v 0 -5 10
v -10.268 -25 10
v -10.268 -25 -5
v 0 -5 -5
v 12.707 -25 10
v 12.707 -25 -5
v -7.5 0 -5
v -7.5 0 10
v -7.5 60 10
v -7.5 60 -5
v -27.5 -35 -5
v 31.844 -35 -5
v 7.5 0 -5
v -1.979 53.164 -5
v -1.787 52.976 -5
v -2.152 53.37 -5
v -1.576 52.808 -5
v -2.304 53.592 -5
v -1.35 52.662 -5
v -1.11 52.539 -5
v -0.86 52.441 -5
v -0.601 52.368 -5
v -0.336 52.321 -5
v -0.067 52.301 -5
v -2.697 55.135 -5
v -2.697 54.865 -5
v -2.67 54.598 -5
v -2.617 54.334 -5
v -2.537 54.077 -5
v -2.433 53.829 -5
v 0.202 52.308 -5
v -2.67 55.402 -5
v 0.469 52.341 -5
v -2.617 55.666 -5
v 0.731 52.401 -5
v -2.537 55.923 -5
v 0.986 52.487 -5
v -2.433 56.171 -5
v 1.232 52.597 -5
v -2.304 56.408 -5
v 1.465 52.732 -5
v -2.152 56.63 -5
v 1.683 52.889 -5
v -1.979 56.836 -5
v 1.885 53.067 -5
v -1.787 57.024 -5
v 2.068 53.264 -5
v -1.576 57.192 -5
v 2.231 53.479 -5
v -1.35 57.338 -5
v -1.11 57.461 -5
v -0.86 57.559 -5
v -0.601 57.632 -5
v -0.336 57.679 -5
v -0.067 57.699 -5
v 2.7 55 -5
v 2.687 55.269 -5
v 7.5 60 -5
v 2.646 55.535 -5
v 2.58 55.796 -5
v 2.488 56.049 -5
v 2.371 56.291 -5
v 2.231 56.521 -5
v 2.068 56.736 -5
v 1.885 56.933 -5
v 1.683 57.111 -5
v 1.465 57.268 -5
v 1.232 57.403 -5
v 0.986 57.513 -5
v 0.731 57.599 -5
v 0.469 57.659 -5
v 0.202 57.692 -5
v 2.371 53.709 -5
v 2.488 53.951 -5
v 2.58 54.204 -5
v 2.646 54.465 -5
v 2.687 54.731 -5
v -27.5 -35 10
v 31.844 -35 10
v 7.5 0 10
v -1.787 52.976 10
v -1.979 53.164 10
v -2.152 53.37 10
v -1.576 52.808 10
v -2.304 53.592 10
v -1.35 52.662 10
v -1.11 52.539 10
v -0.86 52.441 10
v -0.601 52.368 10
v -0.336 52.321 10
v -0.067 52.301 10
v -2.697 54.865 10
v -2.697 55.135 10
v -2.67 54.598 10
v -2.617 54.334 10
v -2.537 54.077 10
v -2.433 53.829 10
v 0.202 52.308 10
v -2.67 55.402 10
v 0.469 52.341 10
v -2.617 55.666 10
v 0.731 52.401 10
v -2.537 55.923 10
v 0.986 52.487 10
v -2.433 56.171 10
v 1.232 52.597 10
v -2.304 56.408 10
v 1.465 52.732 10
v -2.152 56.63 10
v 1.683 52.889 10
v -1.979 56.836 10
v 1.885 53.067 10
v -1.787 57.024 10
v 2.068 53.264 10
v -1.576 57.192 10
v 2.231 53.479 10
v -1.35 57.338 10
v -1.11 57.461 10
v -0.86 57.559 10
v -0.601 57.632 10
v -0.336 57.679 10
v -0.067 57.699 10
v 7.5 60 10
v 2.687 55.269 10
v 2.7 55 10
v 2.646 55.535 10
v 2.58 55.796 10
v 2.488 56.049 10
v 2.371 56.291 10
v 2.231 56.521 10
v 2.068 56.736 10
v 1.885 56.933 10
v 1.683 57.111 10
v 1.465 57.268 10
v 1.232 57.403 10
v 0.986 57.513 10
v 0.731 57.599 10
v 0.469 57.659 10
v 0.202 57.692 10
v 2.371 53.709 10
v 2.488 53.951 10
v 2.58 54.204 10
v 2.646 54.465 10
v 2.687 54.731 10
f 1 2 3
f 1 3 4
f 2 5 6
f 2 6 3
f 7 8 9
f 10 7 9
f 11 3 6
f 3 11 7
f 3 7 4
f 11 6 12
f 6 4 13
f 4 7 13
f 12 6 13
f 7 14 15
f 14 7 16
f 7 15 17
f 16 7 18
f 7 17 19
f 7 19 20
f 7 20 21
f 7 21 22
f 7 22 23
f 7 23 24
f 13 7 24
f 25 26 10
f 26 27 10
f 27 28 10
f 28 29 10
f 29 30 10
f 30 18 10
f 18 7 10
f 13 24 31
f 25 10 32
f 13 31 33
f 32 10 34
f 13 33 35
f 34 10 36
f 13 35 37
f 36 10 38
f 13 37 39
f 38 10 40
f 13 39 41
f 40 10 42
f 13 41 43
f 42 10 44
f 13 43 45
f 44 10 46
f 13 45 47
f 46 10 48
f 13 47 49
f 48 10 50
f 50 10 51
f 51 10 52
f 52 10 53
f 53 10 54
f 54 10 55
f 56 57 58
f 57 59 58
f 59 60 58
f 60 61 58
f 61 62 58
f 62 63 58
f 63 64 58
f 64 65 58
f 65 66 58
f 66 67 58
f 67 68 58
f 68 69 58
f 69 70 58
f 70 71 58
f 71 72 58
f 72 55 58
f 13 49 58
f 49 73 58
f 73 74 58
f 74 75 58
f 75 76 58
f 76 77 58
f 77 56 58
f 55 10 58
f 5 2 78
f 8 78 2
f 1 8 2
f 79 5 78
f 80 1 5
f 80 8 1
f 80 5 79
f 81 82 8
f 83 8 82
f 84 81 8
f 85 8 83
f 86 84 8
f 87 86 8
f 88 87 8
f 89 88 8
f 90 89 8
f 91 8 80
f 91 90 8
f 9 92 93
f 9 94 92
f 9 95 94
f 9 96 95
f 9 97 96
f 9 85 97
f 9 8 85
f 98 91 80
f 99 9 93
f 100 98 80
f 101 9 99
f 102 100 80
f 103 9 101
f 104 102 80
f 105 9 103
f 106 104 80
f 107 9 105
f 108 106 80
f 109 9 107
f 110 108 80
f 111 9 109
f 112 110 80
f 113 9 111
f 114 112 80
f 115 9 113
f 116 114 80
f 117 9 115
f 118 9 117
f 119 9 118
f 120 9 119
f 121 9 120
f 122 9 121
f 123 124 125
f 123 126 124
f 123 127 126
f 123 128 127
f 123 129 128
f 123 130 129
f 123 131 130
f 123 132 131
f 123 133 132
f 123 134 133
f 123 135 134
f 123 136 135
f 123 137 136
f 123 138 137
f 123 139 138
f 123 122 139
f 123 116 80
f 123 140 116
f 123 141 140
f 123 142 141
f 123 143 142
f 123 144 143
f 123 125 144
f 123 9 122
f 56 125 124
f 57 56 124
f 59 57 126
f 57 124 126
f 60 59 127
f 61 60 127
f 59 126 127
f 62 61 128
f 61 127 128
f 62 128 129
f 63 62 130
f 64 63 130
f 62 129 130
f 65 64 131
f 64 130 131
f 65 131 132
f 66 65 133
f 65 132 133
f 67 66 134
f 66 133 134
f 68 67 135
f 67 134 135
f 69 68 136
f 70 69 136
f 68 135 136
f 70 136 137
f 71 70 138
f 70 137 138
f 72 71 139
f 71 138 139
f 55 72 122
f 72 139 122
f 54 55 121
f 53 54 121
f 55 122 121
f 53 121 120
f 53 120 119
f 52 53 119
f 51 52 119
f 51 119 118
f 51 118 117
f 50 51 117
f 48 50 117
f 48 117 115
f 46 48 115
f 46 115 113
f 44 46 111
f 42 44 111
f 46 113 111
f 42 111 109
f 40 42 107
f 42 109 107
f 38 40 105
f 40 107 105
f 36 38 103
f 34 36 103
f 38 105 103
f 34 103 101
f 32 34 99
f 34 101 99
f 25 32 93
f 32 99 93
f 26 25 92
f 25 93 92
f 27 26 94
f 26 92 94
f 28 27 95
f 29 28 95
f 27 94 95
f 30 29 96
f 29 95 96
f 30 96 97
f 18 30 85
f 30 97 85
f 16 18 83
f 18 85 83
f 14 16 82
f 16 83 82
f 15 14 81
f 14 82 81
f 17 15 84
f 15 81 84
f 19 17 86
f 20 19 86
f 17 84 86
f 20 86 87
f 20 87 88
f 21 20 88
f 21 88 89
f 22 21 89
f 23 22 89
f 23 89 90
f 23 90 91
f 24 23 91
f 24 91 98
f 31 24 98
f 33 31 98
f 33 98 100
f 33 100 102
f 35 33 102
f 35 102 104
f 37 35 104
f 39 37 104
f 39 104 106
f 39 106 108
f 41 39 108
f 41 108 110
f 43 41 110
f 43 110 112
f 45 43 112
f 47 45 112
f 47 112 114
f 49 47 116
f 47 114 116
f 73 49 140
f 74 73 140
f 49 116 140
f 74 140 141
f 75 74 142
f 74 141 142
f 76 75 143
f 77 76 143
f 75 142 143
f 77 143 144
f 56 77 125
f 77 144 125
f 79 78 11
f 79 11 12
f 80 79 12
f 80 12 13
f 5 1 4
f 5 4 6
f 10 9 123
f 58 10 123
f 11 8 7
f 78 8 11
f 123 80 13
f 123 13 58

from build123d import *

# Parameters (mm, degrees)
SALIENTE_EXTRUIR1_DEPTH = 10
CROQUIS2_R              = 2.5
CORTAR_EXTRUIR1_DEPTH   = 10
CROQUIS4_W              = 15
CROQUIS4_H              = 60
SALIENTE_EXTRUIR2_DEPTH = 15
SALIENTE_EXTRUIR3_DEPTH = 15
CROQUIS6_R              = 2.7
CORTAR_EXTRUIR2_DEPTH   = 15


with BuildPart() as part:
    # Croquis1 → Saliente-Extruir1 (new body)
    with BuildSketch(Plane.XY):
        Polygon((-7.5, 0), (-27.5, -35), (-7.5, -35), (11.843788115, -35), (31.843788115, -35), (7.5, 0), (7.5, 34.865095039), (-7.5, 34.865095039), align=None)
        Polygon((-10.268203217, -25), (0, -5), (12.707404341, -25), align=None, mode=Mode.SUBTRACT)
    extrude(amount=SALIENTE_EXTRUIR1_DEPTH)

    # Croquis2 → Cortar-Extruir1 (cut)
    with BuildSketch(Plane.XY.offset(10)):
        with Locations((0, 28.865095039)):
            Circle(CROQUIS2_R)
    extrude(amount=-CORTAR_EXTRUIR1_DEPTH, mode=Mode.SUBTRACT)

    # Croquis4 → Saliente-Extruir2 (add)
    with BuildSketch(Plane.XY.offset(10)):
        with Locations((0, 30)):
            Rectangle(CROQUIS4_W, CROQUIS4_H)
    extrude(amount=-SALIENTE_EXTRUIR2_DEPTH)

    # Croquis5 → Saliente-Extruir3 (add)
    with BuildSketch(Plane.XY.offset(10)):
        Polygon((-7.5, 0), (-27.5, -35), (31.843788115, -35), (7.5, 0), (-0.734678119, 11.839313291), align=None)
        Polygon((12.707404341, -25), (-10.268203217, -25), (0, -5), align=None, mode=Mode.SUBTRACT)
    extrude(amount=-SALIENTE_EXTRUIR3_DEPTH)

    # Croquis6 → Cortar-Extruir2 (cut)
    with BuildSketch(Plane.XY.offset(10)):
        with Locations((0, 55)):
            Circle(CROQUIS6_R)
    extrude(amount=-CORTAR_EXTRUIR2_DEPTH, mode=Mode.SUBTRACT)


solid = part.part
